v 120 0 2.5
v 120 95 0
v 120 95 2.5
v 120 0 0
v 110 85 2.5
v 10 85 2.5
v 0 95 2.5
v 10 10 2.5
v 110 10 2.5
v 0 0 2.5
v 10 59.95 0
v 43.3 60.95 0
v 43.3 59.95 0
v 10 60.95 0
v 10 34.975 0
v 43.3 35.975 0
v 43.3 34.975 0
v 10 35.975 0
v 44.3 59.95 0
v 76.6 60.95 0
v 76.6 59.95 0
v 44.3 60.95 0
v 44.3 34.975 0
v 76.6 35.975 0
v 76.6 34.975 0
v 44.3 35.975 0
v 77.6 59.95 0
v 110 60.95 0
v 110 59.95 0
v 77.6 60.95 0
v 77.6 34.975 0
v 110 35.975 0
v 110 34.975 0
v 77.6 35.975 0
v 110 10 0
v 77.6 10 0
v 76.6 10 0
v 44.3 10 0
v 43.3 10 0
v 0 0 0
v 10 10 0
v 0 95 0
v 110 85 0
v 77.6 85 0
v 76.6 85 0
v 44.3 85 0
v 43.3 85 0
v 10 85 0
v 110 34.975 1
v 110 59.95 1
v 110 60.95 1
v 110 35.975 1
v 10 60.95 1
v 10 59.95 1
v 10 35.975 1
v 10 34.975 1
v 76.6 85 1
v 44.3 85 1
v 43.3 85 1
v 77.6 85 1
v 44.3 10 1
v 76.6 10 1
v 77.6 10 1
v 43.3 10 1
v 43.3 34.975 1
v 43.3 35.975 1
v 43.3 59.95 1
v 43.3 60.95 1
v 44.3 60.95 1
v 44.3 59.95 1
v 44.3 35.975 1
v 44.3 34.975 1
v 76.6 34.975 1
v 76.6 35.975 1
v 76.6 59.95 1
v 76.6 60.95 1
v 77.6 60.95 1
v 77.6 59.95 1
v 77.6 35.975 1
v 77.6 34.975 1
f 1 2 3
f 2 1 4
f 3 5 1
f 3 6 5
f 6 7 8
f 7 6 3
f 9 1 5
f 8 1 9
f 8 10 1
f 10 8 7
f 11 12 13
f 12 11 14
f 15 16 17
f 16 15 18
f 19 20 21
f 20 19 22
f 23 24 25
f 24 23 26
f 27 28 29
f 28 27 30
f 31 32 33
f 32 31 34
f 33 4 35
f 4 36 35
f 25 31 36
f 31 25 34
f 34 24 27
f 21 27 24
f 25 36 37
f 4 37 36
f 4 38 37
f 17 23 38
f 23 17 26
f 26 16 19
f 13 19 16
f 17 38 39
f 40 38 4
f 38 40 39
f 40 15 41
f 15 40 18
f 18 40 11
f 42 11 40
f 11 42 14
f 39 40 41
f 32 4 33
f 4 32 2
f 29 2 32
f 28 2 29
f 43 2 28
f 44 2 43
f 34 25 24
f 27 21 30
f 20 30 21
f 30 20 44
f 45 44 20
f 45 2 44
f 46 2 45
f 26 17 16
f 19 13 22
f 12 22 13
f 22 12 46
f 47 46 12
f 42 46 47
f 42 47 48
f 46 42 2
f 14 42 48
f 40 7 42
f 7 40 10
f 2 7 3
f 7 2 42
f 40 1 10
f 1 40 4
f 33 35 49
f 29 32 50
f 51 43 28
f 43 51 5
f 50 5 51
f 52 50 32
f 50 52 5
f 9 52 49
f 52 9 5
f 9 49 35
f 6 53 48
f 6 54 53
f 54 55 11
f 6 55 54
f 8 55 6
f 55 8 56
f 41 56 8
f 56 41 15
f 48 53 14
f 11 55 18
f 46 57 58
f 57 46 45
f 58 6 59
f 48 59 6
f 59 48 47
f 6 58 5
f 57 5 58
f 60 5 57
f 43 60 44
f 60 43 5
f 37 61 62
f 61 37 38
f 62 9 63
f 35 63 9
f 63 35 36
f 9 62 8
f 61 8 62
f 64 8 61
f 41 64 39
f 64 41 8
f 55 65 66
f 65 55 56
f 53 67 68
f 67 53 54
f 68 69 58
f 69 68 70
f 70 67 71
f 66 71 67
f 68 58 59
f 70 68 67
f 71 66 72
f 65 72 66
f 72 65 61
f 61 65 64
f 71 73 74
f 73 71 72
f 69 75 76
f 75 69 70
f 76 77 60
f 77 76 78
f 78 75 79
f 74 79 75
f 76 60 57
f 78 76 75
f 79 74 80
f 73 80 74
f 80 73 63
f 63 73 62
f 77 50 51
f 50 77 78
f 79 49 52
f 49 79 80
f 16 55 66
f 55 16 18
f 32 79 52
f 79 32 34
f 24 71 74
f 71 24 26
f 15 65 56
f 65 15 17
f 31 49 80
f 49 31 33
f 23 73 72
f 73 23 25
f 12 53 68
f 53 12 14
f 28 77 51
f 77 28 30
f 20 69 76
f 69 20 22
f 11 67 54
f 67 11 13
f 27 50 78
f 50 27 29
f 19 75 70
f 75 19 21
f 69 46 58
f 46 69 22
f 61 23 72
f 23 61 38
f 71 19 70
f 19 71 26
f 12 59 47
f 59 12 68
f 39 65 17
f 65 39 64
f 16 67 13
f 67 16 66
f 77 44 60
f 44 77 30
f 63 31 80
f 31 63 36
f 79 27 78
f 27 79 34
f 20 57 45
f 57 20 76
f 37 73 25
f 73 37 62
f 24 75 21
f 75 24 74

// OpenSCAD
// Width of aspect ratio, 16 for 16x9.
asp_width = 4;

// Height of aspect ratio, 9 for 16x9.
asp_height = 3;

// Width of viewport in mm.
abs_width = 100;

// Thickness of frame in mm.
frame_thick = 10;

// Thickness of model along the z axis.
z_thick = 2.5;

// Calculated aspect ratio for calculating the height.
asp_ratio = asp_height/asp_width;
// Calculated outer width in mm
out_width = abs_width + (frame_thick * 2);
//Calculated outer height in mm
out_height = (abs_width*asp_ratio) + (frame_thick * 2);
//Calculated inner height in mm
in_height = abs_width*asp_ratio;

difference() {
    cube([out_width, out_height, z_thick]);
    
    translate([frame_thick,frame_thick,0])
        cube([abs_width, in_height, z_thick]);
}

//translate([out_width/2,frame_thick/2,z_thick])
    //linear_extrude(1)
    //text(str(asp_width, ":", asp_height), valign="center", halign="center", size=frame_thick*.75);

translate([0,(in_height*.333)+frame_thick,0])
    cube([out_width,1,1]);

translate([0,(in_height*.666)+frame_thick,0])
    cube([out_width,1,1]);

translate([(abs_width*.333)+frame_thick,0,0])
    cube([1,out_height,1]);

translate([(abs_width*.666)+frame_thick,0,0])
    cube([1,out_height,1]);
